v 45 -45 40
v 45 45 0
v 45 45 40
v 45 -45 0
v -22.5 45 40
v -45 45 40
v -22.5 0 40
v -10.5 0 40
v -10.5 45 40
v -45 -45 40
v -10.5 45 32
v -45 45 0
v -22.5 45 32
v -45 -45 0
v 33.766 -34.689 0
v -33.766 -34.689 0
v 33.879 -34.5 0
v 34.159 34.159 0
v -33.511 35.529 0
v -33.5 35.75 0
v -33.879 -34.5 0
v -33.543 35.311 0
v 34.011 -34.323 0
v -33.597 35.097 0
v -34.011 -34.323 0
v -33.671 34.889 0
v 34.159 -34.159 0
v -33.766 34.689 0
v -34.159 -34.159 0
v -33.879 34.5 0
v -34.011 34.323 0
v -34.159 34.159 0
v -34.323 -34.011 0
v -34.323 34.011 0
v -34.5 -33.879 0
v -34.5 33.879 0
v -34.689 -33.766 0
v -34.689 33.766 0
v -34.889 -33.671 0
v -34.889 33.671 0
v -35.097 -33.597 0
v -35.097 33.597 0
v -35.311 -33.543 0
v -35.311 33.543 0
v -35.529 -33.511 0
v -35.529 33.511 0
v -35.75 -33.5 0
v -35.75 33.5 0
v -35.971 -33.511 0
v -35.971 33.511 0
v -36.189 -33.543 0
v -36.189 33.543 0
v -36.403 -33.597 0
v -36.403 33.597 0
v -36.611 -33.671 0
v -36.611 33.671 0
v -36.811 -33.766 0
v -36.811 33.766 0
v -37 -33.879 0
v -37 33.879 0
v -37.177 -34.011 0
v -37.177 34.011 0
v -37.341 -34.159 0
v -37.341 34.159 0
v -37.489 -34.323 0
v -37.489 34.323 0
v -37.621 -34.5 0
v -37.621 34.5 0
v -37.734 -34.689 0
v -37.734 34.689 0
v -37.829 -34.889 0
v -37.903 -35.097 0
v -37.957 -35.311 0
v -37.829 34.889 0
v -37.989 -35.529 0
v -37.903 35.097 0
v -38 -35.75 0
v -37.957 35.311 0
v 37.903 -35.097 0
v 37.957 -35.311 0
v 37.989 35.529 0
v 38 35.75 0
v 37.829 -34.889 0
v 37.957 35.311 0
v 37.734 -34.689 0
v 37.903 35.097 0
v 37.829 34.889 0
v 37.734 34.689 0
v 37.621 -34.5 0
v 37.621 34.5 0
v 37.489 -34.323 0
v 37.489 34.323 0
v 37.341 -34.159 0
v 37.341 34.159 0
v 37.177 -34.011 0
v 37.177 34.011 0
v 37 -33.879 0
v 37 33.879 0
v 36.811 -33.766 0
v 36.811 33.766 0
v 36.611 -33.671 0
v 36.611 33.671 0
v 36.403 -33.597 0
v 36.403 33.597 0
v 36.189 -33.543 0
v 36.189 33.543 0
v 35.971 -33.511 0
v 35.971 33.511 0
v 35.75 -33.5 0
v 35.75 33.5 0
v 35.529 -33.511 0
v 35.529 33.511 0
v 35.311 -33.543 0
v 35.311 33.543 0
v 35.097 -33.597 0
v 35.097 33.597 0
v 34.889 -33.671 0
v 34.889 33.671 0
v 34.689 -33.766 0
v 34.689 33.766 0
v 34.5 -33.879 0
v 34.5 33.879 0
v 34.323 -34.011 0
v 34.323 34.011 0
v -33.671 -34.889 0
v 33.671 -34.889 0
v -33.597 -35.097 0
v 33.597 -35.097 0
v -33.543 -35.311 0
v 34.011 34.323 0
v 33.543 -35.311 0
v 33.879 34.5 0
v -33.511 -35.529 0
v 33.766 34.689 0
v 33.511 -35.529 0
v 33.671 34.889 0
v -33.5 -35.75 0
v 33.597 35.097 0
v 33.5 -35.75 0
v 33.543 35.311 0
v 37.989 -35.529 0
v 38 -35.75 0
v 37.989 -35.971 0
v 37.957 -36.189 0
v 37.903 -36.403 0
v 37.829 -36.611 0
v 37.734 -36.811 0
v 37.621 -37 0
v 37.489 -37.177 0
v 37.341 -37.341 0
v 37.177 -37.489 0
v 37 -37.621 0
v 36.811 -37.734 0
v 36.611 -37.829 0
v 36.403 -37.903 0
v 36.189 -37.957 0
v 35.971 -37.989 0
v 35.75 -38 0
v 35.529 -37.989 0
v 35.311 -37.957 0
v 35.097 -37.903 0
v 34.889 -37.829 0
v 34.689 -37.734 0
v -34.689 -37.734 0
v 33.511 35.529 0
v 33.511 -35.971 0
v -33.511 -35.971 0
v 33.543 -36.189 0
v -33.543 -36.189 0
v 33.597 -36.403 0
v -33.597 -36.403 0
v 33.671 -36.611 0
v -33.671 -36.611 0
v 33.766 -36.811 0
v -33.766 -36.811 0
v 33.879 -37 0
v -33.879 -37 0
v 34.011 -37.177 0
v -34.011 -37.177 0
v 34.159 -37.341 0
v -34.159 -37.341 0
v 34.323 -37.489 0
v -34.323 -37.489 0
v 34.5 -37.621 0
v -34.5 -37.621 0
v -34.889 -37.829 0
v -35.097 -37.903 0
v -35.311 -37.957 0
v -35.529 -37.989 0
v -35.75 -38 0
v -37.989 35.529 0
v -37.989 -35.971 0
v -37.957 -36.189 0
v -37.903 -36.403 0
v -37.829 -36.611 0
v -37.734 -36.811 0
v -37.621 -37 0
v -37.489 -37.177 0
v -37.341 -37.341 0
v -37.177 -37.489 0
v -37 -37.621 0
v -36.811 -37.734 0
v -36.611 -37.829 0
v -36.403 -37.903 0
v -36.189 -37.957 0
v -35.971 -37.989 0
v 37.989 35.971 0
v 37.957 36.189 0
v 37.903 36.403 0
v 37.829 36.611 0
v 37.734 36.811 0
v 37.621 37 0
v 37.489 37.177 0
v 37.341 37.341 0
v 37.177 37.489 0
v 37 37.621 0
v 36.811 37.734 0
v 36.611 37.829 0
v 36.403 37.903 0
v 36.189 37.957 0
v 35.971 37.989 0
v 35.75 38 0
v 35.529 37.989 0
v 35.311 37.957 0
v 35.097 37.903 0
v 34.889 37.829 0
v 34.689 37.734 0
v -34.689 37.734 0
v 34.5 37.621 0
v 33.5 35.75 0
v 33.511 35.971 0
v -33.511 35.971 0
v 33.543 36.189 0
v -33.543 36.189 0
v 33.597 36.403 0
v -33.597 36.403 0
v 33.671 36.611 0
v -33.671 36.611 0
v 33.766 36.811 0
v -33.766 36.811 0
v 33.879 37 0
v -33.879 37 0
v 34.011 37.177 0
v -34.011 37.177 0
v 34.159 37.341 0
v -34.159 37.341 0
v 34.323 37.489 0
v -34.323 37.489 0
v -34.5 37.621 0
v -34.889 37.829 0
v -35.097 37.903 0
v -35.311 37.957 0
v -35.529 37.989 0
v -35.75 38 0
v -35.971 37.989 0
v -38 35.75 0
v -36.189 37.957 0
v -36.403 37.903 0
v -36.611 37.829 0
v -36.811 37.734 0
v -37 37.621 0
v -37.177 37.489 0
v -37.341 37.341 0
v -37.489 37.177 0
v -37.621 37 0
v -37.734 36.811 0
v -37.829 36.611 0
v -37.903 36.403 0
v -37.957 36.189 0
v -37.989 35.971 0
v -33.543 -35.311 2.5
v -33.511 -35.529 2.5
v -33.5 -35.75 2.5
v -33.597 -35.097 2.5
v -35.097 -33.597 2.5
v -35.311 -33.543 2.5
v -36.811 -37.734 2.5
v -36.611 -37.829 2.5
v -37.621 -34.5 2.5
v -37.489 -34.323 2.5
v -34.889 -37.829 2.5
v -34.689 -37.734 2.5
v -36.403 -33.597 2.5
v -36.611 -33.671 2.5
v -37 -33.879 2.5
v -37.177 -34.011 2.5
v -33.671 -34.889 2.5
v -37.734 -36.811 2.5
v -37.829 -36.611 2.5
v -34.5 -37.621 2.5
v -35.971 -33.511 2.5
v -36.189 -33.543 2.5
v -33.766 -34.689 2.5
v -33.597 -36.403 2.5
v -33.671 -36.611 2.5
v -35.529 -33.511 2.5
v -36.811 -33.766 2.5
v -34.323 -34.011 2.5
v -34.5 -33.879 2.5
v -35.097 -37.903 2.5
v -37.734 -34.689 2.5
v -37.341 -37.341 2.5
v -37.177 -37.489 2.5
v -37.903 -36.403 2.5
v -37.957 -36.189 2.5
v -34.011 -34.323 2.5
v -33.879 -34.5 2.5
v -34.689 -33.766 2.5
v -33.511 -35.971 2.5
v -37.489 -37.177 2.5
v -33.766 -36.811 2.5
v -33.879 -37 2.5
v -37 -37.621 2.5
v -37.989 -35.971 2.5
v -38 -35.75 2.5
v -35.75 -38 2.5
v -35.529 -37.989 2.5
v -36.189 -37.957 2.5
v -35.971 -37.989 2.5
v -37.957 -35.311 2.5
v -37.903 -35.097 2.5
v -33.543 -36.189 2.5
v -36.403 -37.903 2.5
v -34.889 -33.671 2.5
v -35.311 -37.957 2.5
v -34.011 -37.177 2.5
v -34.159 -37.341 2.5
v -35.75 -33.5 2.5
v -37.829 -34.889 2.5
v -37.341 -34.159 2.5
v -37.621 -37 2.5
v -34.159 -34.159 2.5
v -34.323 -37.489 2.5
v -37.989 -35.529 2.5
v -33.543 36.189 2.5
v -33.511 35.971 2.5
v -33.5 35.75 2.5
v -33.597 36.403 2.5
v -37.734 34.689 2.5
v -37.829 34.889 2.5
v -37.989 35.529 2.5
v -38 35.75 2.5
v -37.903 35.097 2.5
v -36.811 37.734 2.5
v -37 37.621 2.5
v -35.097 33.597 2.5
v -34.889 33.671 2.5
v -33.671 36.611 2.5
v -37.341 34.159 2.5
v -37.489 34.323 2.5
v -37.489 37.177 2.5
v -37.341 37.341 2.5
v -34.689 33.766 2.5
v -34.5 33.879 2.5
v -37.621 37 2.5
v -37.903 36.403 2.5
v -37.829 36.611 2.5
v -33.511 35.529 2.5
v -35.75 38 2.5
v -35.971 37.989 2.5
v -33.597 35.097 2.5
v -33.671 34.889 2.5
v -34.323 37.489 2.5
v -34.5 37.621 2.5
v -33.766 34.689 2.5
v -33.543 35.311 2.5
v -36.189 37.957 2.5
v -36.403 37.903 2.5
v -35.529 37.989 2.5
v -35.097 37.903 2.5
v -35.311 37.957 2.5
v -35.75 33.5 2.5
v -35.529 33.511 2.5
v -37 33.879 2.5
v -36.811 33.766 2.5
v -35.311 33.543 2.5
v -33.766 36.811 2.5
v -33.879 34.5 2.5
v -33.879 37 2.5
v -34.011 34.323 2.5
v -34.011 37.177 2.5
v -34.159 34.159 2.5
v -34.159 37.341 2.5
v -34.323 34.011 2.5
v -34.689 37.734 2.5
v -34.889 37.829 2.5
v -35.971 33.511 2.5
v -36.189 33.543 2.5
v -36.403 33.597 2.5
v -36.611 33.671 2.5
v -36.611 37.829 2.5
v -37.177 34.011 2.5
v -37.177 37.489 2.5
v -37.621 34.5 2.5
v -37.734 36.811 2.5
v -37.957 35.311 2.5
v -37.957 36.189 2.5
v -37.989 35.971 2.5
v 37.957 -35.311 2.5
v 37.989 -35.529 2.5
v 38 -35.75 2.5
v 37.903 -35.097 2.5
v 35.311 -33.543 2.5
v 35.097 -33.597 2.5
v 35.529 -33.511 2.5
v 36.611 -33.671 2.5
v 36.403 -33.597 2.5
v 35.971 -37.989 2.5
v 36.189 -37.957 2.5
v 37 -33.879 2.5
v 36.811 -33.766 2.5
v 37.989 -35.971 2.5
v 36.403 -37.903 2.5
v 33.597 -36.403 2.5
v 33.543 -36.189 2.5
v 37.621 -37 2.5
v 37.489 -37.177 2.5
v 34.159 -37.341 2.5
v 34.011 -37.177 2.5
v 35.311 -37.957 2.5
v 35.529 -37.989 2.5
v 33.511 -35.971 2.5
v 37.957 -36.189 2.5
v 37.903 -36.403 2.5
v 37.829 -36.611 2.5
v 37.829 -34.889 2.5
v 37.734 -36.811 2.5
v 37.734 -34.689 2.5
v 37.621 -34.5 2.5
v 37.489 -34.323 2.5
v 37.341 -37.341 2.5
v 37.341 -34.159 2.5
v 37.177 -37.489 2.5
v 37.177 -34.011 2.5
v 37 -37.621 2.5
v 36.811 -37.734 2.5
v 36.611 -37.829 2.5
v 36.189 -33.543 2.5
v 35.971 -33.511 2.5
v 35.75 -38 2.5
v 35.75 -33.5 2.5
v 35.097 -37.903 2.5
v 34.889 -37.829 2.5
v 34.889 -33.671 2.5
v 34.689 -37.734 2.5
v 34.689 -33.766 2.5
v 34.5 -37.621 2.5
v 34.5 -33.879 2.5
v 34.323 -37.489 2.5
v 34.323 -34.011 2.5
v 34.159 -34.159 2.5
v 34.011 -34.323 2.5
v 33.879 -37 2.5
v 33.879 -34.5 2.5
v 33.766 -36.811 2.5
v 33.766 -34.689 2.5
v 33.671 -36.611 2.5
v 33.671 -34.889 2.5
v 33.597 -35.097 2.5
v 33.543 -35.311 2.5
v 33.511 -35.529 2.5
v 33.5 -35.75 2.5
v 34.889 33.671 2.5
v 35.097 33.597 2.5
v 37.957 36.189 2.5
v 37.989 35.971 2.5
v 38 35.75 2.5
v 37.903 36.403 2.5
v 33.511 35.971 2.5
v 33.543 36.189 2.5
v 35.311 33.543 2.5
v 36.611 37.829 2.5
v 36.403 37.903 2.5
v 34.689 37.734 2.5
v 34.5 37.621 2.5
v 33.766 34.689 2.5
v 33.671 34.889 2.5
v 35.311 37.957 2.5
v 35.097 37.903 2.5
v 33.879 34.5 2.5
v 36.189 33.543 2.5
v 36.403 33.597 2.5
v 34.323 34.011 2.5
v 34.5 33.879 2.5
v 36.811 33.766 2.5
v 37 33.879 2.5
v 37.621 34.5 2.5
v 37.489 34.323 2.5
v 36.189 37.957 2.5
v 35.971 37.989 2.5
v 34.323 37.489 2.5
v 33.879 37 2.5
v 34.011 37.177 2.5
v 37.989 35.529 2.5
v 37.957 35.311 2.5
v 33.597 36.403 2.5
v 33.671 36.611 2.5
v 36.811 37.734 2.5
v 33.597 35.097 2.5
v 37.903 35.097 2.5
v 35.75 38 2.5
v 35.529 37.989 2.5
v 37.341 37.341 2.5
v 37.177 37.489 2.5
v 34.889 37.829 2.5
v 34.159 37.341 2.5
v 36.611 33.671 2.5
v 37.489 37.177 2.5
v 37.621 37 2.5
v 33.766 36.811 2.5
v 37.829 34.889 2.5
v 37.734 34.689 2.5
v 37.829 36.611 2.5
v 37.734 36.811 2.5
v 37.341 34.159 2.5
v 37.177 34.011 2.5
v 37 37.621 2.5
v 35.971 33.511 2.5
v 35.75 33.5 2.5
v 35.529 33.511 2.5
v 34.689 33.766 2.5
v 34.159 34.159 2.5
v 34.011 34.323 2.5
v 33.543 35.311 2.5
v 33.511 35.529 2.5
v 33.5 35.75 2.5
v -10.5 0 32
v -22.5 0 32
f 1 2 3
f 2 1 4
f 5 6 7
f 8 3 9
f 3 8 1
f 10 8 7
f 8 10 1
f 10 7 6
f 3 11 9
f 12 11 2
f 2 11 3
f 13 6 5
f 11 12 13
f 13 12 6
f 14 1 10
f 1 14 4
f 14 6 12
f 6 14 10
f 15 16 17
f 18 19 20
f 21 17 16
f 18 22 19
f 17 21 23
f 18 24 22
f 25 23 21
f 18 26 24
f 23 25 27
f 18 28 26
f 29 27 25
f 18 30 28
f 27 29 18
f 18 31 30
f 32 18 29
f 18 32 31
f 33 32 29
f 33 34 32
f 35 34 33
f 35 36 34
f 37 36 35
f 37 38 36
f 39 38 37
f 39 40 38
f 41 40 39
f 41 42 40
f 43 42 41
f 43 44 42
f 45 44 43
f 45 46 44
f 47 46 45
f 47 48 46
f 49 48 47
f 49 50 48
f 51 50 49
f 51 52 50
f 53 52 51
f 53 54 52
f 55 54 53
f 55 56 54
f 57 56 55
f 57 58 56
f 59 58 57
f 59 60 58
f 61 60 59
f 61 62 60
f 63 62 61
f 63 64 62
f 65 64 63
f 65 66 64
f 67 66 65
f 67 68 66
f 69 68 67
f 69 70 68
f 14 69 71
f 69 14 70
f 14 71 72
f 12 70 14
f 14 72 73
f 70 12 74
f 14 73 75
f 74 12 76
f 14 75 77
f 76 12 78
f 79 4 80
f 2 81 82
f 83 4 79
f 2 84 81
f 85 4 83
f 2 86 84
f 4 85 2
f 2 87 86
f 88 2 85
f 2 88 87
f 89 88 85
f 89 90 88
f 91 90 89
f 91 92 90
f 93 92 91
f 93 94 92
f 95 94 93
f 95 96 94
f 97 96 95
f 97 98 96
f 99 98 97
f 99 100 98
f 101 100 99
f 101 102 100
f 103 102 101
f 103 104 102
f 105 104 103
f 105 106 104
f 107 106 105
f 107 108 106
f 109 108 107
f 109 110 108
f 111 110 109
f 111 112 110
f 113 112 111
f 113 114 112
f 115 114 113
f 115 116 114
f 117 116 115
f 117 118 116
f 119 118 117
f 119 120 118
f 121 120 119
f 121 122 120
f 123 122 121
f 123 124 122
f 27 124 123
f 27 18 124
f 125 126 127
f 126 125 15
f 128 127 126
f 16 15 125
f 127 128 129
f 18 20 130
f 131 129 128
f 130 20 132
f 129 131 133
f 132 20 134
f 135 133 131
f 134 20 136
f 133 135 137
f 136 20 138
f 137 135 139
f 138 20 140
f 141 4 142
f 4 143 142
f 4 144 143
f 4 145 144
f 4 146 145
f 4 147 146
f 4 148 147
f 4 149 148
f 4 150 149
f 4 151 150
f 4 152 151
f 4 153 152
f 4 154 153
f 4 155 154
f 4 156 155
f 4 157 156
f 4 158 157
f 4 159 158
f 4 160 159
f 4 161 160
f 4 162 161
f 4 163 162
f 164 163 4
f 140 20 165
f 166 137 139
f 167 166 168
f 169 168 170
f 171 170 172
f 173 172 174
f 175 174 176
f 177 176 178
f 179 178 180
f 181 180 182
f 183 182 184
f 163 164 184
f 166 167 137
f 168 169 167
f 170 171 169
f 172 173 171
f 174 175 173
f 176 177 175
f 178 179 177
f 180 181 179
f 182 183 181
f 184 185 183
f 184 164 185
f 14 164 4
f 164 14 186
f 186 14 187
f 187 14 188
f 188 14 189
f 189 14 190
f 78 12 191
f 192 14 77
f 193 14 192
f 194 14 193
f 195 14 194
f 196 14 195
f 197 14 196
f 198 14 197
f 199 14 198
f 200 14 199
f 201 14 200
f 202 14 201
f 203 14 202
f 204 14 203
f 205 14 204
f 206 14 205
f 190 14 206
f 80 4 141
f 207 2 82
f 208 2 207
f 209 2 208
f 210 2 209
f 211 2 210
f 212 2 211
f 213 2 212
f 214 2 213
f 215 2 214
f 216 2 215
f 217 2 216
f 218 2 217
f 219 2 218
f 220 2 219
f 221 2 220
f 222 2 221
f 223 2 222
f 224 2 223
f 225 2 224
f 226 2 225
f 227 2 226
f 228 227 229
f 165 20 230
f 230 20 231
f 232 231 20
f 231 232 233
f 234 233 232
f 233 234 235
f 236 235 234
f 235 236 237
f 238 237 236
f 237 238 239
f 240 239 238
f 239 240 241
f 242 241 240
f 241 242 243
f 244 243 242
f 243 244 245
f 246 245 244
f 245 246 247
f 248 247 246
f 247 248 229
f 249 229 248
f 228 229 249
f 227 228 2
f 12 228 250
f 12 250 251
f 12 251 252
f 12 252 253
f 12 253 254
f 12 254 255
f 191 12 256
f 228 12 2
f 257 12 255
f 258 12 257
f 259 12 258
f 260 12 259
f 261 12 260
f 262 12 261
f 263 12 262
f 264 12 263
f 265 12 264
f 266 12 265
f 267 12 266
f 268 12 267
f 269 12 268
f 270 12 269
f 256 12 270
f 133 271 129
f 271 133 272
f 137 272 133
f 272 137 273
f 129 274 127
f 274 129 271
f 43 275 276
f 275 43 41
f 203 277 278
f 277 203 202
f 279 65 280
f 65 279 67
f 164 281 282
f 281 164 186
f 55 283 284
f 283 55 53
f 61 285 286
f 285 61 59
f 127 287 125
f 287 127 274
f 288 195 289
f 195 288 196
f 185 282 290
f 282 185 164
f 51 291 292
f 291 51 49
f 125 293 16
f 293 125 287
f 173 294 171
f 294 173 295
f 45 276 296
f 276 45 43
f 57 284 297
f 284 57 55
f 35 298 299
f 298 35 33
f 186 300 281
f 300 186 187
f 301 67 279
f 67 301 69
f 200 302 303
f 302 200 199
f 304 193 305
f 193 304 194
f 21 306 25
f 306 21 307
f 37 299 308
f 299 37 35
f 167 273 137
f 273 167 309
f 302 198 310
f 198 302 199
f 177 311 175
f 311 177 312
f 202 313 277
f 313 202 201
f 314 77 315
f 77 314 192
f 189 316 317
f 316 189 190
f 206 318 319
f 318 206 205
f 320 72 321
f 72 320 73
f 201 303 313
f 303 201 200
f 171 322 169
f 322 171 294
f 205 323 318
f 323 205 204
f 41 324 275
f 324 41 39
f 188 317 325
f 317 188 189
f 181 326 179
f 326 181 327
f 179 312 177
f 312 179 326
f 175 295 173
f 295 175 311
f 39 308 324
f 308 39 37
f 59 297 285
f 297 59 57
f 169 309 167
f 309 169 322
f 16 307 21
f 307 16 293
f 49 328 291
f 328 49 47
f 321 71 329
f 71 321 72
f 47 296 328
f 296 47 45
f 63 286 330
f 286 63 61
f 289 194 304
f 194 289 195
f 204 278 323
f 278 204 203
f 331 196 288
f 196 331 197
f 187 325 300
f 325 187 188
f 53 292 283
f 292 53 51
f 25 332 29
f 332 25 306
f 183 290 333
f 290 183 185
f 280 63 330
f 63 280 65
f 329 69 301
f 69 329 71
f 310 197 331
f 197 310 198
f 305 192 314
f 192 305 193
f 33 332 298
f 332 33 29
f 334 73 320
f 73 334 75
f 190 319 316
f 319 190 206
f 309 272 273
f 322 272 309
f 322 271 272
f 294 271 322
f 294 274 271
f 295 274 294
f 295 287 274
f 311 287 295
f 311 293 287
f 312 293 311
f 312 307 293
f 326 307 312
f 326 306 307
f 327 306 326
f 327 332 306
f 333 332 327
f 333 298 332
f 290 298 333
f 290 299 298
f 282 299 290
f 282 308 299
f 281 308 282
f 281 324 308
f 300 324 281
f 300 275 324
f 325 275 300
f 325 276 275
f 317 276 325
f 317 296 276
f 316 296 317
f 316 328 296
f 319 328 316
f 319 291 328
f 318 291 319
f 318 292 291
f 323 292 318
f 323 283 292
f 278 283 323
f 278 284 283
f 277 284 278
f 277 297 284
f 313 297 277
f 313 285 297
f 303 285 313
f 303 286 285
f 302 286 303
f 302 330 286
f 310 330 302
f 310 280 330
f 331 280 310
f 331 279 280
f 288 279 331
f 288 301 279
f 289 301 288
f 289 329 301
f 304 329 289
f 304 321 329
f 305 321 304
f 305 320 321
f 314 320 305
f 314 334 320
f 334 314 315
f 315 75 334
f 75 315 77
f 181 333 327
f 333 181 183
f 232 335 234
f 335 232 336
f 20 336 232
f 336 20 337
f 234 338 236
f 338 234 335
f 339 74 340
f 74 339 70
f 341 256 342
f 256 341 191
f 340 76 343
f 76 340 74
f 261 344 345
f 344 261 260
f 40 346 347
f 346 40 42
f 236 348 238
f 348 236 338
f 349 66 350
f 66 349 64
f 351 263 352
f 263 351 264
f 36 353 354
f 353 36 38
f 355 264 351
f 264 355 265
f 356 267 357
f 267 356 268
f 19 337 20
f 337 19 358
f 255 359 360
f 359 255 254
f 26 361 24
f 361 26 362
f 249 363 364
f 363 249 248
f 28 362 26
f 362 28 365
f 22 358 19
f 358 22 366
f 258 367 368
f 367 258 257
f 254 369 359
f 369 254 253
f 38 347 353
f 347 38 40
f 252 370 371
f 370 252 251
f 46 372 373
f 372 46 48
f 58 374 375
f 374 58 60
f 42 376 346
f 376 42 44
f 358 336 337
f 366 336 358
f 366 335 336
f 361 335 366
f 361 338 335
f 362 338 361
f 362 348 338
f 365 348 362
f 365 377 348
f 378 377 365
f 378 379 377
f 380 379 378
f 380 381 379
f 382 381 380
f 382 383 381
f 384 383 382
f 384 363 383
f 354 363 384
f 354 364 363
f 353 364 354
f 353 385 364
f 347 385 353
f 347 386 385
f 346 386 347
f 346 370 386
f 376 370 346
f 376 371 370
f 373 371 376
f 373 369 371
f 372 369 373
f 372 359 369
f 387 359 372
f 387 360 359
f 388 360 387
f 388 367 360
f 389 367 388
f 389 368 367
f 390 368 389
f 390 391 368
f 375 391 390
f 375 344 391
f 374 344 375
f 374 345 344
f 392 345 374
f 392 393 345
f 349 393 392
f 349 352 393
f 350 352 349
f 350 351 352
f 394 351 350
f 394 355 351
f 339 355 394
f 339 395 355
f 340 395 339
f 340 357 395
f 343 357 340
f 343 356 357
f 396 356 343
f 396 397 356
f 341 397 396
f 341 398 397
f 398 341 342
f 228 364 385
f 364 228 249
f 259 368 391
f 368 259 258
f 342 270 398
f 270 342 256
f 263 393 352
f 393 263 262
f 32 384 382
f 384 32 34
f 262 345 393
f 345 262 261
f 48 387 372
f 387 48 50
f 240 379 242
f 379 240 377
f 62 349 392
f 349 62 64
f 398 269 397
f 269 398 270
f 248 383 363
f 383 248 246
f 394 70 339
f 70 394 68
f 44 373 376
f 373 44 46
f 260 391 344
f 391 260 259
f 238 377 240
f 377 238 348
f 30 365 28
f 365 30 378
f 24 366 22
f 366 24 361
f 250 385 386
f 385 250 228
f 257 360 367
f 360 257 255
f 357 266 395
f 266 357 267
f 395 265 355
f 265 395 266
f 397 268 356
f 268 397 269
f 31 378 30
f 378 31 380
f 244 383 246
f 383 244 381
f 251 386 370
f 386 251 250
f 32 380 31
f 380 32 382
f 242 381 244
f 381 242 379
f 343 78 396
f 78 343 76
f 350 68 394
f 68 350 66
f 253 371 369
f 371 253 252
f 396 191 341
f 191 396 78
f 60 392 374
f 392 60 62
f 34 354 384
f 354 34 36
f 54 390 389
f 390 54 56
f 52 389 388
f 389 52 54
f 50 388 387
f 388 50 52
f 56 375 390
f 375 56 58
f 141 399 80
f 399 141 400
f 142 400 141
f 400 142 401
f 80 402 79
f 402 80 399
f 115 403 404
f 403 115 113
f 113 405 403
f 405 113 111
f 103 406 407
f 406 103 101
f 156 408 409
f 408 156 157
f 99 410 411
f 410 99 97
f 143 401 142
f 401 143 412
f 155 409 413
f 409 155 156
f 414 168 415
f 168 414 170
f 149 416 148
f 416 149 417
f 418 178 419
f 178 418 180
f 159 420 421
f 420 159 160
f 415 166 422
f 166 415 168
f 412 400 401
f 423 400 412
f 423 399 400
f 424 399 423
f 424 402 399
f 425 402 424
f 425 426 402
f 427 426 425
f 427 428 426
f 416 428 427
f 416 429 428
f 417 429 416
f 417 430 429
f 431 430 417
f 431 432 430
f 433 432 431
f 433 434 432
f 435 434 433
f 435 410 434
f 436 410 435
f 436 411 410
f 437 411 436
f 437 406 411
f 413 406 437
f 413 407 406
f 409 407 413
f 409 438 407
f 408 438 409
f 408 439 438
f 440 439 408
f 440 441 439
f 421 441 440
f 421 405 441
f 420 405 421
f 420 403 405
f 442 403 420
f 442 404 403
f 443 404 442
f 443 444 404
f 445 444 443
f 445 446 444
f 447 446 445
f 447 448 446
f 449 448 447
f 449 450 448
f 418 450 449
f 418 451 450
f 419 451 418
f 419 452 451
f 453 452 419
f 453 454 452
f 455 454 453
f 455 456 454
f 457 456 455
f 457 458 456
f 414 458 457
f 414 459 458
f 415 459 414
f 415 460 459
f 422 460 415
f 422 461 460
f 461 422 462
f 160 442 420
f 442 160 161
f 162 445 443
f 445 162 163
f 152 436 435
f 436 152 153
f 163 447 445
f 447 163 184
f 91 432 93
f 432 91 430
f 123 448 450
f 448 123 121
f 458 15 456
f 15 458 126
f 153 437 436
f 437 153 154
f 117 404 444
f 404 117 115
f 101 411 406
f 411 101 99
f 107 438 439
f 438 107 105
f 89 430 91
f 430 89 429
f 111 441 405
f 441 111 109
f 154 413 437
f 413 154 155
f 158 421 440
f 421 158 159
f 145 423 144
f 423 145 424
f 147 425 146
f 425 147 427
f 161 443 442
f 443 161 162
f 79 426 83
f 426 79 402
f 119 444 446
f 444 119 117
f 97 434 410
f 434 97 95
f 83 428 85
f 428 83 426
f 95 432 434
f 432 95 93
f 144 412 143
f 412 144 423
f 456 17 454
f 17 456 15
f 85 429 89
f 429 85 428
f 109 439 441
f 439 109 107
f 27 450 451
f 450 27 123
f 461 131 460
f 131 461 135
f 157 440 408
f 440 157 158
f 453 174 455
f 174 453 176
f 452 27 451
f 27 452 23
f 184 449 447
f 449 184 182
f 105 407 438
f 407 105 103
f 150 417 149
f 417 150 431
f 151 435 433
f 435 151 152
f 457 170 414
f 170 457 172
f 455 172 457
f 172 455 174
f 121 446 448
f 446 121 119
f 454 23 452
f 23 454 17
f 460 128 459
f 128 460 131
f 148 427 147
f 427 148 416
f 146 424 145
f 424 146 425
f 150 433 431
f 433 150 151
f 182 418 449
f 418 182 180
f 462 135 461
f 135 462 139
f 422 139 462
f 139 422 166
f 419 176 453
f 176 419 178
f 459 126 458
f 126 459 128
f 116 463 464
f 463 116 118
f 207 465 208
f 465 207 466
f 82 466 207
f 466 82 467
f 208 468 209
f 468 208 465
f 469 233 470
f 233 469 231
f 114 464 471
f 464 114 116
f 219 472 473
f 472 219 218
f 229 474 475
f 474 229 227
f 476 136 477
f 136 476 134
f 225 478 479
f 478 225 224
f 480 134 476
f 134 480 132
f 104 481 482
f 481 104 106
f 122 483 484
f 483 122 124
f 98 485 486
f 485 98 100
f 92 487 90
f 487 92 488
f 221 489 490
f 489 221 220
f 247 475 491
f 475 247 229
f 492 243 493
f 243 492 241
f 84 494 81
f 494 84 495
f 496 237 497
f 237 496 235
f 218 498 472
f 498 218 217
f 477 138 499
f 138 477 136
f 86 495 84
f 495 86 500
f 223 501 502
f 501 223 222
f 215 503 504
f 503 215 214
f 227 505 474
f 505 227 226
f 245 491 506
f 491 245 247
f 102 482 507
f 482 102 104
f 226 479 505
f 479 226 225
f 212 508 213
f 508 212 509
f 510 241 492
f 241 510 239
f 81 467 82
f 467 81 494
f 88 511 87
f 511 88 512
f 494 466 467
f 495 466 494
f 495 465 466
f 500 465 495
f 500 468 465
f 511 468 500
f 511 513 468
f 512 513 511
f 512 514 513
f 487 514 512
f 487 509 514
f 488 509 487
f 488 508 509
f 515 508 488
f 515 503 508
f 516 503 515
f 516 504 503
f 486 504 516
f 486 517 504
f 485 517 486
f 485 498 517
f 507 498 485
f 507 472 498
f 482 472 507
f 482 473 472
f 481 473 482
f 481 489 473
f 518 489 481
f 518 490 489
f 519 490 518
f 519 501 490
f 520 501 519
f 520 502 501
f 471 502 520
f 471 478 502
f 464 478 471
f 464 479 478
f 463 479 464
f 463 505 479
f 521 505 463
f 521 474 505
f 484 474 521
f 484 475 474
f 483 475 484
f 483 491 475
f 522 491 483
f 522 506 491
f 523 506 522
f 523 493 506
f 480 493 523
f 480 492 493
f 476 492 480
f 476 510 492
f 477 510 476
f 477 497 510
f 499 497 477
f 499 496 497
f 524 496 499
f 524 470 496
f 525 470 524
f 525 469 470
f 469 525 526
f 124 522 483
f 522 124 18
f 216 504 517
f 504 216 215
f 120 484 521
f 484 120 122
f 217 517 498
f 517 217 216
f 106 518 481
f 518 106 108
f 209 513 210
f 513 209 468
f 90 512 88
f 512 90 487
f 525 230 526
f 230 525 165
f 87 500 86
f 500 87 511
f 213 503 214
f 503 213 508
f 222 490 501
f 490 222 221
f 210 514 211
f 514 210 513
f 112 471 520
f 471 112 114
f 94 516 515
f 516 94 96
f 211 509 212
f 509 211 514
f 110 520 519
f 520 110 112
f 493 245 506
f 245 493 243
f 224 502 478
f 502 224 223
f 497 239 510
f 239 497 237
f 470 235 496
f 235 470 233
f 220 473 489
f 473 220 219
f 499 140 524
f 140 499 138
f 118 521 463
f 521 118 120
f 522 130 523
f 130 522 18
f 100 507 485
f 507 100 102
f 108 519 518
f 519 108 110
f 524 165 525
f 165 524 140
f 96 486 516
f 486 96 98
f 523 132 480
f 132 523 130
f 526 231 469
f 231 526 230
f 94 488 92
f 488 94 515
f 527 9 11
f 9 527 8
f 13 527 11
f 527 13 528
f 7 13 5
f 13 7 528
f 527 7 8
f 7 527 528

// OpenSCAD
// Magnetic stirrer housing for 80 mm PC case fan
// Print orientation: top plate on bed (z = 0), walls build upward (+Z)

// ---------- Parameters ----------
plate_t      = 2;     // top plate thickness (mm)
wall_t       = 2.5;   // wall thickness (mm)
box_h        = 40;    // total height of box (mm)
outer_x      = 90;    // outer size in X (mm)
outer_y      = 90;    // outer size in Y (mm)
hole_d       = 4.5;   // M4 screw hole diameter (mm)
hole_pitch   = 71.5;  // square pattern side for screw holes (mm)
notch_w      = 12;    // cable notch width (mm)
notch_depth  = 8;     // cable notch depth from open edge (mm)
eps          = 0.5;   // cutter overshoot past faces (mm)

$fn = 64;

// ---------- Model ----------
difference() {
    union() {
        // Top plate
        translate([-outer_x/2, -outer_y/2, 0])
            cube([outer_x, outer_y, plate_t]);

        // Four walls rising from the plate to the open top
        for (a = [0, 90, 180, 270])
            rotate([0, 0, a])
                translate([0, -outer_y/2, plate_t])
                    cube([outer_x/2, outer_y, box_h - plate_t]);
    }

    // Screw holes through the top plate, centred on the plate
    for (x = [-hole_pitch/2, hole_pitch/2])
        for (y = [-hole_pitch/2, hole_pitch/2])
            translate([x, y, -eps])
                cylinder(d = hole_d, h = plate_t + 2*eps);

    // Cable notch in one wall, centred along the wall,
    // reaching 8 mm down from the open edge (z = 32 to z = 40)
    translate([-outer_x/4, 0, box_h - notch_depth])
        cube([notch_w, outer_y, notch_depth + eps]);
}
